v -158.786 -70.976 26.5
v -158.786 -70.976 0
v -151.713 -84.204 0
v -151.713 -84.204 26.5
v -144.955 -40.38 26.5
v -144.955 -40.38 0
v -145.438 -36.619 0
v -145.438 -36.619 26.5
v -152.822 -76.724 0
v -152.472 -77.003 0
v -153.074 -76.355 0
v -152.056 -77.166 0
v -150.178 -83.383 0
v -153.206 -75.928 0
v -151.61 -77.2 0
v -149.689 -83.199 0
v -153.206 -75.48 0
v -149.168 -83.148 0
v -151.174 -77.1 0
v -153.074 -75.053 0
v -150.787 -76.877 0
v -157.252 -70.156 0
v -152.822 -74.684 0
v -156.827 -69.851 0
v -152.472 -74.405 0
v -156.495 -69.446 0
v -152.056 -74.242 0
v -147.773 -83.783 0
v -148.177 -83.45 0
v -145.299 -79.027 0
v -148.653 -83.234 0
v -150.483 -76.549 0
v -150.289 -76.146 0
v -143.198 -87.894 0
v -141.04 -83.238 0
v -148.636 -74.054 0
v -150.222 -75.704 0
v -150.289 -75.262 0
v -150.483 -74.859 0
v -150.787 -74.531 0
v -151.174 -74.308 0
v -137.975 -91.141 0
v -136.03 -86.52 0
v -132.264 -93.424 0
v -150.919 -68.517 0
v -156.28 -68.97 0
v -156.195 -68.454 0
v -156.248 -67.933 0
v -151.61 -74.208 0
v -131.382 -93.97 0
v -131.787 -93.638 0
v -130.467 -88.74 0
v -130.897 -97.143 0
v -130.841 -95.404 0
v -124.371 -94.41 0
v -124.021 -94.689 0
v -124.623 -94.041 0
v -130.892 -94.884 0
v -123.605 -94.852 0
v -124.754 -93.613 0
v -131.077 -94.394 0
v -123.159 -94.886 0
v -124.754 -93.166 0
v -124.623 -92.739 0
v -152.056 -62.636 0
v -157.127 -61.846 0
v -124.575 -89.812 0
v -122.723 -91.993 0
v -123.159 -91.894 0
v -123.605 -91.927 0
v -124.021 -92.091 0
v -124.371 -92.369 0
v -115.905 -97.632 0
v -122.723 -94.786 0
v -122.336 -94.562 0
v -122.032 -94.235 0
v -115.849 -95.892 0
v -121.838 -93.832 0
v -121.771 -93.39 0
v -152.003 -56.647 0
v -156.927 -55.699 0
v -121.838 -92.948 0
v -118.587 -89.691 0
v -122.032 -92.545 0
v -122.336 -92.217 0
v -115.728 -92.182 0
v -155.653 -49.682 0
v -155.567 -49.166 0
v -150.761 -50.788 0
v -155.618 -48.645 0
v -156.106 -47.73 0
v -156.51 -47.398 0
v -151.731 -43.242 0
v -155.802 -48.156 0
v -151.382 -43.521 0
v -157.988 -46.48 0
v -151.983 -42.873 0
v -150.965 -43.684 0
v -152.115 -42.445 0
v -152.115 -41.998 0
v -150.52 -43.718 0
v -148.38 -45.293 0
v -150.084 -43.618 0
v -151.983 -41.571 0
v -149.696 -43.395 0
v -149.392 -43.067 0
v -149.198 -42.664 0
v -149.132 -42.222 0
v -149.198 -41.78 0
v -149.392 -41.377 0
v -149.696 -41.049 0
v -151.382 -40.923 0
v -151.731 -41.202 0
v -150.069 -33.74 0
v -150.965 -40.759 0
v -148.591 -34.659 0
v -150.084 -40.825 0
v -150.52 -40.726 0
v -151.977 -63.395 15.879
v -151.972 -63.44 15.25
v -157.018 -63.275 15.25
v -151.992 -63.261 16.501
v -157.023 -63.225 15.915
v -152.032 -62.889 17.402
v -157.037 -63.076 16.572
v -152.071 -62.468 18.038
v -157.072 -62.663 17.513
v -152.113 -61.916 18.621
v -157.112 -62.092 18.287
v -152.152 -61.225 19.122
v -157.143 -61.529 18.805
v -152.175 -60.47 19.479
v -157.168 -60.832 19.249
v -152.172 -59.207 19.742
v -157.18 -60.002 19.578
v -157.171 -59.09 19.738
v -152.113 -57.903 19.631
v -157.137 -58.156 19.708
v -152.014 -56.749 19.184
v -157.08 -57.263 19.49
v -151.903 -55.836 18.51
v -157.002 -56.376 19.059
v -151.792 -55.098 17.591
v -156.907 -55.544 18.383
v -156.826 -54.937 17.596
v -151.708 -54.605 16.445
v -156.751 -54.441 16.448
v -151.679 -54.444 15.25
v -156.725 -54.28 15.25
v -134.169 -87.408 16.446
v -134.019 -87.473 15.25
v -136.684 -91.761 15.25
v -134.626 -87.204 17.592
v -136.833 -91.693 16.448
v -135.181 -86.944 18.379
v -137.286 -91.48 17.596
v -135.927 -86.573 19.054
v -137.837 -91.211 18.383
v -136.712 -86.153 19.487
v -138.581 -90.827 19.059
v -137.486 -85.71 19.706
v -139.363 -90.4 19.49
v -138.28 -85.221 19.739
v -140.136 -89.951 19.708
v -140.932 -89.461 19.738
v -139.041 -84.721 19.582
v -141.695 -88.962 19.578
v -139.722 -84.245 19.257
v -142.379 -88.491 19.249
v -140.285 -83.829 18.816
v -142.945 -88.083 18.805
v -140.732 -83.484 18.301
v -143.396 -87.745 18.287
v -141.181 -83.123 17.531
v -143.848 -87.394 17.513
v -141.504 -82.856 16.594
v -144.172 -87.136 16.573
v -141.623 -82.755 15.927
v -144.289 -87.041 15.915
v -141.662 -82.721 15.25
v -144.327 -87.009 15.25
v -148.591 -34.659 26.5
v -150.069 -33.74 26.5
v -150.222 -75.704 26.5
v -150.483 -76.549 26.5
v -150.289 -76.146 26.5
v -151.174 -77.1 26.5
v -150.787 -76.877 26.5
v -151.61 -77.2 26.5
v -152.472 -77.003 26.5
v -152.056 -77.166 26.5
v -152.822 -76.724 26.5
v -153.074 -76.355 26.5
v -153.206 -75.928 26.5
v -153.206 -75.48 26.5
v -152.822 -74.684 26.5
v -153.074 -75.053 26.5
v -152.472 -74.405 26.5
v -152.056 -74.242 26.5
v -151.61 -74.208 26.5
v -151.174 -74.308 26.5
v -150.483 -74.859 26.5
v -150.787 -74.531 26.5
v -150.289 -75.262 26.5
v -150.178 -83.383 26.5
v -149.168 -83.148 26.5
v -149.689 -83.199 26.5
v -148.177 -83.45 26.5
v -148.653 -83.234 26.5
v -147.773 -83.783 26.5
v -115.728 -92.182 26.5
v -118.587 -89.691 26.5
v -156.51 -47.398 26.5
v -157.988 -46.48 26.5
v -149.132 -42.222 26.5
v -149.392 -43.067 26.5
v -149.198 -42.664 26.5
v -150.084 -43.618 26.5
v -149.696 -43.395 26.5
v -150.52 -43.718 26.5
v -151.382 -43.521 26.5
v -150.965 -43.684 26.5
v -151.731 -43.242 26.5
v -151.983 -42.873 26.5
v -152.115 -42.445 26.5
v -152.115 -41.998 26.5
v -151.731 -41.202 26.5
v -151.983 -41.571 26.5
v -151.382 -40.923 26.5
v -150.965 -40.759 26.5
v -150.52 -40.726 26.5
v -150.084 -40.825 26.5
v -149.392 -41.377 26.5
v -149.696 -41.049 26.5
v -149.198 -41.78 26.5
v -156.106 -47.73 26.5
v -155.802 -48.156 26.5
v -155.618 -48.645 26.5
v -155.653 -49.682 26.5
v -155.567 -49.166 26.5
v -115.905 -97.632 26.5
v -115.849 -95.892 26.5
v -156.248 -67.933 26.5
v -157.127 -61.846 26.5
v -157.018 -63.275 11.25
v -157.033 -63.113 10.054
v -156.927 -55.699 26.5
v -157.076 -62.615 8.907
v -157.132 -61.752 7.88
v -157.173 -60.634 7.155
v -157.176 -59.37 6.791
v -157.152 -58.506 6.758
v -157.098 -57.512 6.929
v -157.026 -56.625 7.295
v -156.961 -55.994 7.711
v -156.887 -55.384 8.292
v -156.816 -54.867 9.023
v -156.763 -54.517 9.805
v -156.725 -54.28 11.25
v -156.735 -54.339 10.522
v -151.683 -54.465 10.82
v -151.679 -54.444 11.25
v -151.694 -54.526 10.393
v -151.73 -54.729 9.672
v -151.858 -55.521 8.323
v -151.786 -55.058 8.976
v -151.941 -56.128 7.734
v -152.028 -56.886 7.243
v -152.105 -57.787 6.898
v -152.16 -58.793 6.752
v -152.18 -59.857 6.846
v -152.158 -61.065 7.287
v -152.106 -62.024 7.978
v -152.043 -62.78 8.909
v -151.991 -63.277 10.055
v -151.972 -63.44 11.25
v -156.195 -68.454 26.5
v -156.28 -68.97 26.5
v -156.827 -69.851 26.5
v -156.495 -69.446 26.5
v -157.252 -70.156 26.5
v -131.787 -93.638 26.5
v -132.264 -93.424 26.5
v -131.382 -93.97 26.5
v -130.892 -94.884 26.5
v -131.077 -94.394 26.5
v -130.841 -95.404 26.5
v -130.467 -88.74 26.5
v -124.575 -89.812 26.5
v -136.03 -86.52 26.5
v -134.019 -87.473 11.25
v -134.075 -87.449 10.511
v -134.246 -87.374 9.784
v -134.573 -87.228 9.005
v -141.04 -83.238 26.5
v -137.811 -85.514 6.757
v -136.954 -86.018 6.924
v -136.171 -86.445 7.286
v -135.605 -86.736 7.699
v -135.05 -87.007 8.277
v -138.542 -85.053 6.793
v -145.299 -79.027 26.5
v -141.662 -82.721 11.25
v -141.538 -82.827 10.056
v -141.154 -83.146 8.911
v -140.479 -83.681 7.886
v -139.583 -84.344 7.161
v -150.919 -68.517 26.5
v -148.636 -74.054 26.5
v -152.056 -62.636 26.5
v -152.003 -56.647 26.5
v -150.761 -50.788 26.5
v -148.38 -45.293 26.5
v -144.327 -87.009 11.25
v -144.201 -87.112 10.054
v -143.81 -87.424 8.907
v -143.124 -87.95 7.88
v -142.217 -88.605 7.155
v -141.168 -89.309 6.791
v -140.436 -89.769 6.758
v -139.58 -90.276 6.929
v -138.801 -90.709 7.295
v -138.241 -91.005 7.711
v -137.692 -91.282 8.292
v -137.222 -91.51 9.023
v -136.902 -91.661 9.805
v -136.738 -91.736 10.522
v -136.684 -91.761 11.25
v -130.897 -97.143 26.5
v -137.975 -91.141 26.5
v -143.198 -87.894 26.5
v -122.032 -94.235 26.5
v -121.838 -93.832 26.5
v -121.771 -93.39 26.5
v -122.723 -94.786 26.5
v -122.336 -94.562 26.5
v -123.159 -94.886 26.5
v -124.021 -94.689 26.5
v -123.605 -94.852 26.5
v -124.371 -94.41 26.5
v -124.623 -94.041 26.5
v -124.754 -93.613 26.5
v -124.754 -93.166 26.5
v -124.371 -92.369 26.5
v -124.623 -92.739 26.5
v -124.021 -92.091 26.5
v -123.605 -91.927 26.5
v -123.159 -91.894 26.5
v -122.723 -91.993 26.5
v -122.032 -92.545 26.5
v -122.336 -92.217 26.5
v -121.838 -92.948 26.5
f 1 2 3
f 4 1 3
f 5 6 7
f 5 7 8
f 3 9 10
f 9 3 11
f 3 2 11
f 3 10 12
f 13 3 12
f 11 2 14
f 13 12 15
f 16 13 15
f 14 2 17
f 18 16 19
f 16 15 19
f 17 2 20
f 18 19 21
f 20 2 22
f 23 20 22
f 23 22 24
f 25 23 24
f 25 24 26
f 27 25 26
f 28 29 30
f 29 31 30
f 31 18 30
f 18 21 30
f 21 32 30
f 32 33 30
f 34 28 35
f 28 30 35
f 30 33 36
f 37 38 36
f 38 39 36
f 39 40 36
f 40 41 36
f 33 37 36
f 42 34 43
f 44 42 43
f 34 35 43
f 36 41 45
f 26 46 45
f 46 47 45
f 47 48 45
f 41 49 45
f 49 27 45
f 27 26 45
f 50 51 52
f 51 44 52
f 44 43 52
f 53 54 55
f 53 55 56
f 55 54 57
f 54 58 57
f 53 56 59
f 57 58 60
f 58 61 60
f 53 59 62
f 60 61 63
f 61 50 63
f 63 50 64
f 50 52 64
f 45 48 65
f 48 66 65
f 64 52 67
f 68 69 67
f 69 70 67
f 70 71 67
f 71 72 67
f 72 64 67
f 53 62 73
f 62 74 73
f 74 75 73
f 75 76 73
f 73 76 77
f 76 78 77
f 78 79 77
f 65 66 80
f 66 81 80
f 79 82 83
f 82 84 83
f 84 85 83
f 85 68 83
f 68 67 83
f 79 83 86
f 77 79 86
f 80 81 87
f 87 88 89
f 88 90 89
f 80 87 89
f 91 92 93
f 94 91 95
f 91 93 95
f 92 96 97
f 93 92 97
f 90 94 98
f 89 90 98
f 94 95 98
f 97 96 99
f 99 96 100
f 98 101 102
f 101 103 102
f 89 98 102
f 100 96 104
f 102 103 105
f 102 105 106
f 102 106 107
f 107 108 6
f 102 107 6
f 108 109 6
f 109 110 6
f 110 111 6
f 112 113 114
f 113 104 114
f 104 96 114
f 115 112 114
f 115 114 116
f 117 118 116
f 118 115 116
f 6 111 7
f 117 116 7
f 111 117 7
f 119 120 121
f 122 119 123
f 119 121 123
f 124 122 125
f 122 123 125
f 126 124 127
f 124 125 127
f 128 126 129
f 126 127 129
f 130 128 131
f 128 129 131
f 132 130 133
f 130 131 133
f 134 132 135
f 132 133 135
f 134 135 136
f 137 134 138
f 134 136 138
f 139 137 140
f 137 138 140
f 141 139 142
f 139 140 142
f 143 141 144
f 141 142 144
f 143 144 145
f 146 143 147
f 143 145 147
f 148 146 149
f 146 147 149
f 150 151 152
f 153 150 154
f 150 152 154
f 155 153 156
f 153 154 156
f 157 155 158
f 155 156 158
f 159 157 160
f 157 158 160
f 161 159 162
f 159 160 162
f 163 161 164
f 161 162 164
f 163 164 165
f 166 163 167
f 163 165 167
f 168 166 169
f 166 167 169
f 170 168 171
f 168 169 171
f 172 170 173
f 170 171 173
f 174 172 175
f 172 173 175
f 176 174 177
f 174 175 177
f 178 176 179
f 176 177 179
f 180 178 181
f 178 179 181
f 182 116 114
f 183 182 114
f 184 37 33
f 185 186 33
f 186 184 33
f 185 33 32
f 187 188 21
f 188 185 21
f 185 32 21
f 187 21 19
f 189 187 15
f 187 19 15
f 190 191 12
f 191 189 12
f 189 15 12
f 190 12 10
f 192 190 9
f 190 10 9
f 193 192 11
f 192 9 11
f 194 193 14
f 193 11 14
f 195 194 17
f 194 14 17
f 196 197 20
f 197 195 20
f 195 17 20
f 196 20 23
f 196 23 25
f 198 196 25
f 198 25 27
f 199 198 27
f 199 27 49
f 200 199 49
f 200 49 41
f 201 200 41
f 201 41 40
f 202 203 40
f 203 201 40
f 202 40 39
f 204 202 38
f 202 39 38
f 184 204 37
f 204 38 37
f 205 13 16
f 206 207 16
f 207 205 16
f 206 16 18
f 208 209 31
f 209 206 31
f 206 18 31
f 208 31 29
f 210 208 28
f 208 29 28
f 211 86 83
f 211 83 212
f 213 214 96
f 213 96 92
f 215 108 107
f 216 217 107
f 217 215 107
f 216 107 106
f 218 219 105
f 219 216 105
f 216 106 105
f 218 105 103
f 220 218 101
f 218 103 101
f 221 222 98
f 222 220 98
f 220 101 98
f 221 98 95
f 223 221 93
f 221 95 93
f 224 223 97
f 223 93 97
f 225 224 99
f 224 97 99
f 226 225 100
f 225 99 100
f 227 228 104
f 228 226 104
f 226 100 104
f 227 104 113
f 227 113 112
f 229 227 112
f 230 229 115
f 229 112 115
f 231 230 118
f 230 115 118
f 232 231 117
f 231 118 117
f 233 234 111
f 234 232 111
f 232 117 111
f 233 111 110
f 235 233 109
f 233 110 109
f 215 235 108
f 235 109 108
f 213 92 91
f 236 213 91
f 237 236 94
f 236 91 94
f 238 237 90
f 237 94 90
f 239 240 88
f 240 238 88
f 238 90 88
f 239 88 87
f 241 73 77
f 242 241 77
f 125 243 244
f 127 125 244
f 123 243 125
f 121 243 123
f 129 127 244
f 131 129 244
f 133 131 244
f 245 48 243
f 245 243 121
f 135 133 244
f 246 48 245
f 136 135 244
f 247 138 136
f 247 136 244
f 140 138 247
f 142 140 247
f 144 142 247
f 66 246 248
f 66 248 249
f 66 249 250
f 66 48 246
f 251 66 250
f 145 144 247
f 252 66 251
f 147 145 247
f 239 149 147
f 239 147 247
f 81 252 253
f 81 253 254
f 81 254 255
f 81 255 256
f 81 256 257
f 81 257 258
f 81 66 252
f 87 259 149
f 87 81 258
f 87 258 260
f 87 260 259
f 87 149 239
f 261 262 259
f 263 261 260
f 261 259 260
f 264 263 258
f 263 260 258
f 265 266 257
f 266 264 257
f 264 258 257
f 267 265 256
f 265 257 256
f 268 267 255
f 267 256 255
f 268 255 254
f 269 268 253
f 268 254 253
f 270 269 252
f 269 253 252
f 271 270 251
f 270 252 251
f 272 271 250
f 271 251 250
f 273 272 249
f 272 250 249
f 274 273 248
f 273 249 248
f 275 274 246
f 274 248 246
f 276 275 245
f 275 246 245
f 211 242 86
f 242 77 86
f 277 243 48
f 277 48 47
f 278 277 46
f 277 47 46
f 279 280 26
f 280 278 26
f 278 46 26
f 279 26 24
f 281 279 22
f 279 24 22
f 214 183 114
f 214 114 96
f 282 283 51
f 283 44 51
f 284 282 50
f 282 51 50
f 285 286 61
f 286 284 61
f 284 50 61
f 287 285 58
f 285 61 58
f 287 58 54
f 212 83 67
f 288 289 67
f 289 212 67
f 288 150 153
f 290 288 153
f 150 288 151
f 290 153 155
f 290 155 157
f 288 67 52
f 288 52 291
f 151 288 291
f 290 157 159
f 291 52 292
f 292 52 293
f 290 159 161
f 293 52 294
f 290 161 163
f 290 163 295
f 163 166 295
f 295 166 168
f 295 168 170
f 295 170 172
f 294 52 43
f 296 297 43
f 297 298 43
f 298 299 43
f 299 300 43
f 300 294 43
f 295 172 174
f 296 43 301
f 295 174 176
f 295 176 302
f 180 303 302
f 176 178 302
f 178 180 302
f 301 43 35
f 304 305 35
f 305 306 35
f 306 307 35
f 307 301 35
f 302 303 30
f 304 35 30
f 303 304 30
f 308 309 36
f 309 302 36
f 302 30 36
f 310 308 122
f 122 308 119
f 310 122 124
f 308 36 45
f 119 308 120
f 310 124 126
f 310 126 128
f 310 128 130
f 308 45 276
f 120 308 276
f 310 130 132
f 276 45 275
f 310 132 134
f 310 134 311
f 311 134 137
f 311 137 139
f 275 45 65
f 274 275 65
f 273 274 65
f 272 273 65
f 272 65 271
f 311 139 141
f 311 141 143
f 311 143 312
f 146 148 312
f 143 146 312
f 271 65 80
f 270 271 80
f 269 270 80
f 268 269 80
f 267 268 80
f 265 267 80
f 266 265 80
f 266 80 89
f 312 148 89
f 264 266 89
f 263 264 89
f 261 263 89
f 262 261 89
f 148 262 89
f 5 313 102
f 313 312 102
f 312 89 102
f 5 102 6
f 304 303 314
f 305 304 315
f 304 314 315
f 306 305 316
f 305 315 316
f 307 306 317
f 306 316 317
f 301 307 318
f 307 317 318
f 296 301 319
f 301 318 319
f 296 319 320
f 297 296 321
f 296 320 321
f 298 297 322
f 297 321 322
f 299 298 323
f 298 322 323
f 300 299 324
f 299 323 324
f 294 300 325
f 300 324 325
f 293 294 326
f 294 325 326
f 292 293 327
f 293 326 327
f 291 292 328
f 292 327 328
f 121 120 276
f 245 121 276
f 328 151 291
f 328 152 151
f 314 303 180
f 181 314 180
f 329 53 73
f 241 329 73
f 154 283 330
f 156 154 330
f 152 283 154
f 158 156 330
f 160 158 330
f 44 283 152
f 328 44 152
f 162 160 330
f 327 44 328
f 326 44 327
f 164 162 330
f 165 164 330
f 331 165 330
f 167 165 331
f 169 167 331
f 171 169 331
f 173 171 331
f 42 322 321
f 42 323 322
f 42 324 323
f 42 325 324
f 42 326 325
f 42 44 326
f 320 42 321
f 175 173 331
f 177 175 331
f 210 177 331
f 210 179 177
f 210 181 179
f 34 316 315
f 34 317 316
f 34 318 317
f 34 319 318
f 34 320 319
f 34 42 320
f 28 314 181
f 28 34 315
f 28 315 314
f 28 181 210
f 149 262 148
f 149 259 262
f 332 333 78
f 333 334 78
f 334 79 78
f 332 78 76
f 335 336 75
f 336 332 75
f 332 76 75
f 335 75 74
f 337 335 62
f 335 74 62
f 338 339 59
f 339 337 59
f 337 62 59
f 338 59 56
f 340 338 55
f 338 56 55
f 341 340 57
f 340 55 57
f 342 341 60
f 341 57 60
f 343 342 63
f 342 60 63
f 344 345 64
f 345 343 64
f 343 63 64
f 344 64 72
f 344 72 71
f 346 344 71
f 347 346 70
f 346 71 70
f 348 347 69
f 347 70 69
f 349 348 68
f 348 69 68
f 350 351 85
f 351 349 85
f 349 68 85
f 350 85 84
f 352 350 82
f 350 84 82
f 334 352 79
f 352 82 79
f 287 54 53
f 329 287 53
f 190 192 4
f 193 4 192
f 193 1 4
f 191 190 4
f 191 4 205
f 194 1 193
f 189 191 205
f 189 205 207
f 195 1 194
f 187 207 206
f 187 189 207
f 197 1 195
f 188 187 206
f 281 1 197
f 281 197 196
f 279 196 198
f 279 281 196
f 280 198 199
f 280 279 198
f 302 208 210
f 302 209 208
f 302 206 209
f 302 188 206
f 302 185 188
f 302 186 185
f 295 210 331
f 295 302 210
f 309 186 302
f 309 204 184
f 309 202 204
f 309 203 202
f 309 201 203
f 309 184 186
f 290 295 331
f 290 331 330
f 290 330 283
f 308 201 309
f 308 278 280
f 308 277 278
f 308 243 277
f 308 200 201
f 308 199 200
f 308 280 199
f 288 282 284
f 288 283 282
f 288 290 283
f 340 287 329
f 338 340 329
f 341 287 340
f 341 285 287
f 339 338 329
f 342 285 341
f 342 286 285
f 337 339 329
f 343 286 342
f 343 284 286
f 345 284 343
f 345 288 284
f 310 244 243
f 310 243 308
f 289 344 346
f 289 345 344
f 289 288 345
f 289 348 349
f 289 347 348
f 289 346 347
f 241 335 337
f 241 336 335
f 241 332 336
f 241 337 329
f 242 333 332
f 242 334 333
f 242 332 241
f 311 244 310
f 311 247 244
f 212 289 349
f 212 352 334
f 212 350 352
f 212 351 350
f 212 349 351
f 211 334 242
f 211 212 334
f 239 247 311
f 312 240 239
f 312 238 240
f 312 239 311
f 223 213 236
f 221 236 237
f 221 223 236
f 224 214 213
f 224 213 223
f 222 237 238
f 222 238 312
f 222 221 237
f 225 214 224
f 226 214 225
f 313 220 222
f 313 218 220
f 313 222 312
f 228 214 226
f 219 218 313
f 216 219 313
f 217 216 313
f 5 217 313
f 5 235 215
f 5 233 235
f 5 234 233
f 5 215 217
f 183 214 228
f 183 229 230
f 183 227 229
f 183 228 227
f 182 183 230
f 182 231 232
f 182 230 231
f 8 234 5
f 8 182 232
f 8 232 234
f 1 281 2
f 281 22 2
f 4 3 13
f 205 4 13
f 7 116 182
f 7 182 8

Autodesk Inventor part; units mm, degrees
ref_plane "Work Plane1" through (0, 0, 0) normal (0, 0, 1) x (1, 0, 0)
sketch "Sketch1" plane through (0, 0, 0) normal (0, 0, 1) x (1, 0, 0)
  line L0 (-114.7595, -23.8164) -> (-86.516, -0.3214) projected
  arc A0 (-83.238, -1.9261) -> (-86.516, -0.3214) centre (-85.2369, -1.8589) ccw projected
  arc A1 (-83.238, -1.9261) -> (-80.4978, -22.1613) centre (-22.2724, -3.9734) ccw projected
  arc A2 (-84.3159, -27.354) -> (-80.4978, -22.1613) centre (-84.3159, -23.354) ccw projected
  line L1 (-84.3159, -27.354) -> (-113.4805, -27.354) projected
  arc A3 (-114.7595, -23.8164) -> (-113.4805, -27.354) centre (-113.4805, -25.354) ccw projected
  circle A4 centre (71.296, -16.8454) radius 1.5 projected
  circle A5 centre (-18.8152, -59.8032) radius 1.5 projected
  circle A6 centre (-53.4562, -50.8504) radius 1.5 projected
  circle A7 centre (-60.8075, 36.5725) radius 1.5 projected
  circle A8 centre (-28.5162, 51.9811) radius 1.5 projected
  circle A9 centre (-9.173, 50.4079) radius 1.5 projected
  circle A10 centre (-44.8423, 47.6065) radius 1.5 projected
  circle A11 centre (-67.2628, -37.2117) radius 1.5 projected
  circle A12 centre (-38.1378, -57.9935) radius 1.5 projected
  circle A13 centre (45.81, -34.6909) radius 1.5 projected
  circle A14 centre (-22.2724, -3.9734) radius 24.5 projected
  line L2 (17.4995, 54.7179) -> (28.6687, 48.4472) projected
  line L3 (8.4026, 48.2499) -> (17.4995, 54.7179) projected
  arc A15 (6.5013, 48.0227) -> (8.4026, 48.2499) centre (7.2436, 49.8798) ccw projected
  line L4 (-7.3529, 53.5603) -> (6.5013, 48.0227) projected
  arc A16 (-7.3529, 53.5603) -> (-12.4241, 54.6417) centre (-22.2724, -3.9734) ccw projected
  line L5 (-12.5849, 53.6843) -> (-12.4241, 54.6417) projected
  arc A17 (-14.821, 52.0331) -> (-12.5849, 53.6843) centre (-14.5573, 54.0157) ccw projected
  arc A18 (-14.821, 52.0331) -> (-23.537, 52.5125) centre (-22.2724, -3.9734) ccw projected
  arc A19 (-25.5786, 54.3989) -> (-23.537, 52.5125) centre (-23.5818, 54.512) ccw projected
  line L6 (-25.6541, 55.7327) -> (-25.5786, 54.3989) projected
  arc A20 (-25.6541, 55.7327) -> (-31.8766, 55.0521) centre (-22.2724, -3.9734) ccw projected
  line L7 (-43.4677, 51.9463) -> (-31.8766, 55.0521) projected
  arc A21 (-43.4677, 51.9463) -> (-49.1968, 49.4245) centre (-22.2724, -3.9734) ccw projected
  line L8 (-48.5953, 48.2316) -> (-49.1968, 49.4245) projected
  arc A22 (-49.4201, 45.5771) -> (-48.5953, 48.2316) centre (-50.3811, 47.3311) ccw projected
  arc A23 (-49.4201, 45.5771) -> (-56.7287, 40.804) centre (-22.2724, -3.9734) ccw projected
  arc A24 (-59.4908, 41.1159) -> (-56.7287, 40.804) centre (-57.9484, 42.389) ccw projected
  line L9 (-60.1088, 41.8646) -> (-59.4908, 41.1159) projected
  arc A25 (-60.1088, 41.8646) -> (-63.9599, 38.3925) centre (-22.2724, -3.9734) ccw projected
  line L10 (-73.8637, 25.8129) -> (-63.9599, 38.3925) projected
  line L11 (-73.8637, 25.8129) -> (-144.5637, -33.0004) projected
  arc A26 (-144.5637, -33.0004) -> (-146.1648, -34.4172) centre (-122.1805, -59.9075) ccw projected
  arc A27 (-148.5912, -34.6592) -> (-146.1648, -34.4172) centre (-147.5353, -32.9607) ccw projected
  line L12 (-148.5912, -34.6592) -> (-150.0693, -33.7404) projected
  line L13 (-150.0693, -33.7404) -> (-157.9882, -46.4797) projected
  line L14 (-157.9882, -46.4797) -> (-156.5102, -47.3985) projected
  arc A28 (-155.6533, -49.6815) -> (-156.5102, -47.3985) centre (-157.566, -49.0971) ccw projected
  arc A29 (-155.6533, -49.6815) -> (-156.2478, -67.9334) centre (-122.1805, -59.9075) ccw projected
  arc A30 (-157.2515, -70.1557) -> (-156.2478, -67.9334) centre (-158.1945, -68.392) ccw projected
  line L15 (-157.2515, -70.1557) -> (-158.7862, -70.9764) projected
  line L16 (-158.7862, -70.9764) -> (-151.7131, -84.204) projected
  line L17 (-151.7131, -84.204) -> (-150.1784, -83.3834) projected
  arc A31 (-147.7729, -83.7828) -> (-150.1784, -83.3834) centre (-149.2353, -85.1471) ccw projected
  arc A32 (-147.7729, -83.7828) -> (-132.2635, -93.4236) centre (-122.1805, -59.9075) ccw projected
  arc A33 (-130.8408, -95.404) -> (-132.2635, -93.4236) centre (-132.8397, -95.3388) ccw projected
  line L18 (-130.8408, -95.404) -> (-130.8974, -97.1434) projected
  line L19 (-130.8974, -97.1434) -> (-115.9054, -97.6318) projected
  line L20 (-115.9054, -97.6318) -> (-115.8487, -95.8923) projected
  arc A34 (-114.3001, -94.0088) -> (-115.8487, -95.8923) centre (-113.8498, -95.9574) ccw projected
  arc A35 (-114.3001, -94.0088) -> (-111.5272, -93.2468) centre (-122.1805, -59.9075) ccw projected
  line L21 (-111.5272, -93.2468) -> (-17.5702, -63.2237) projected
  line L22 (-1.8974, -59.9532) -> (-17.5702, -63.2237) projected
  line L23 (-3.6226, -55.2133) -> (-1.8974, -59.9532) projected
  arc A36 (-2.4006, -52.6404) -> (-3.6226, -55.2133) centre (-1.7432, -54.5293) ccw projected
  line L24 (40.7711, -37.6143) -> (-2.4006, -52.6404) projected
  arc A37 (41.7759, -37.5336) -> (40.7711, -37.6143) centre (41.4286, -39.5032) ccw projected
  line L25 (49.1414, -38.8323) -> (41.7759, -37.5336) projected
  line L26 (49.5371, -36.5883) -> (49.1414, -38.8323) projected
  arc A38 (51.1536, -34.967) -> (49.5371, -36.5883) centre (51.5067, -36.9355) ccw projected
  arc A39 (51.1536, -34.967) -> (69.7278, -21.9611) centre (46.3856, -8.3913) ccw projected
  arc A40 (71.8042, -20.9967) -> (69.7278, -21.9611) centre (71.4569, -22.9663) ccw projected
  line L27 (74.0482, -21.3924) -> (71.8042, -20.9967) projected
  line L28 (78.128, 1.745) -> (74.0482, -21.3924) projected
  line L29 (78.128, 1.745) -> (69.8258, 3.2089) projected
  arc A41 (28.6687, 48.4472) -> (69.8258, 3.2089) centre (78.5082, 52.4493) ccw projected
  circle A42 centre (46.3856, -8.3913) radius 8 projected
  circle A43 centre (24.8362, 42.9855) radius 2.1 projected
  circle A44 centre (69.0444, -1.2227) radius 2.1 projected
  circle A45 centre (32.9741, 22.501) radius 2.1 projected
  circle A46 centre (48.56, 6.9152) radius 2.1 projected
  line L30 (61.5225, -11.0604) -> (64.993, -11.6723) projected
  arc A47 (66.5678, -14.1946) -> (64.993, -11.6723) centre (64.6457, -13.6419) ccw projected
  arc A48 (55.6053, -27.2592) -> (66.5678, -14.1946) centre (46.3856, -8.3913) ccw projected
  arc A49 (52.8479, -26.1463) -> (55.6053, -27.2592) centre (54.7273, -25.4622) ccw projected
  line L31 (52.8479, -26.1463) -> (51.6426, -22.8348) projected
  arc A50 (52.6012, -20.3753) -> (51.6426, -22.8348) centre (53.522, -22.1507) ccw projected
  arc A51 (52.6012, -20.3753) -> (59.2669, -12.4314) centre (46.3856, -8.3913) ccw projected
  arc A52 (61.5225, -11.0604) -> (59.2669, -12.4314) centre (61.1752, -13.03) ccw projected
  arc A53 (28.8077, -30.3754) -> (33.319, -18.6649) centre (-22.2724, -3.9734) ccw projected
  arc A54 (36.6892, -17.7843) -> (33.319, -18.6649) centre (35.2527, -19.1759) ccw projected
  arc A55 (36.6892, -17.7843) -> (42.4768, -21.313) centre (46.3856, -8.3913) ccw projected
  arc A56 (43.0588, -24.8558) -> (42.4768, -21.313) centre (41.8977, -23.2274) ccw projected
  line L32 (43.0588, -24.8558) -> (31.7455, -32.9222) projected
  arc A57 (28.8077, -30.3754) -> (31.7455, -32.9222) centre (30.5844, -31.2938) ccw projected
  arc A58 (36.3695, 11.8712) -> (41.3146, 7.2953) centre (78.5082, 52.4493) ccw projected
  arc A59 (40.8614, 3.9267) -> (41.3146, 7.2953) centre (40.043, 5.7516) ccw projected
  arc A60 (40.8614, 3.9267) -> (37.576, 1.8381) centre (46.3856, -8.3913) ccw projected
  arc A61 (34.2864, 3.1052) -> (37.576, 1.8381) centre (36.2709, 3.3536) ccw projected
  arc A62 (34.2864, 3.1052) -> (32.9898, 9.9939) centre (-22.2724, -3.9734) ccw projected
  arc A63 (36.3695, 11.8712) -> (32.9898, 9.9939) centre (34.9289, 10.4839) ccw projected
  circle A64 centre (-78.0027, -75.3364) radius 2 projected
  circle A65 centre (-110.6431, -14.2192) radius 2 projected
  circle A66 centre (-91.7471, -81.3441) radius 2 projected
  circle A67 centre (-123.1684, -22.4726) radius 2 projected
  circle A68 centre (-123.2712, -93.3897) radius 1.5 projected
  circle A69 centre (-150.6316, -42.2218) radius 1.5 projected
  circle A70 centre (-151.7223, -75.704) radius 1.5 projected
  circle A71 centre (-76.5892, -34.383) radius 2.05 projected
  circle A72 centre (-93.5857, -34.7301) radius 2.05 projected
  circle A73 centre (-85.7696, -48.6911) radius 2.05 projected
  line L33 (25.2192, -8.9275) -> (12.7605, -6.9639) projected
  arc A74 (10.2276, -3.9982) -> (12.7605, -6.9639) centre (13.2276, -4.0005) ccw projected
  arc A75 (10.2276, -3.9982) -> (9.854, 0.9403) centre (-22.2724, -3.9734) ccw projected
  arc A76 (12.117, 4.3104) -> (9.854, 0.9403) centre (12.8195, 1.3938) ccw projected
  line L34 (12.117, 4.3104) -> (24.3016, 7.2454) projected
  arc A77 (27.9589, 4.8477) -> (24.3016, 7.2454) centre (25.0042, 4.3289) ccw projected
  arc A78 (28.6837, -6.0885) -> (27.9589, 4.8477) centre (-22.2724, -3.9734) ccw projected
  arc A79 (25.2192, -8.9275) -> (28.6837, -6.0885) centre (25.6863, -5.9641) ccw projected
  line L35 (18.5933, -28.9733) -> (7.9021, -22.4328) projected
  arc A80 (6.7854, -18.53) -> (7.9021, -22.4328) centre (9.4676, -19.8737) ccw projected
  arc A81 (6.7854, -18.53) -> (8.6598, -13.9459) centre (-22.2724, -3.9734) ccw projected
  arc A82 (11.9821, -11.903) -> (8.6598, -13.9459) centre (11.515, -14.8664) ccw projected
  line L36 (11.9821, -11.903) -> (24.4408, -13.8666) projected
  arc A83 (26.8641, -17.6335) -> (24.4408, -13.8666) centre (23.9738, -16.83) ccw projected
  arc A84 (22.8108, -27.8167) -> (26.8641, -17.6335) centre (-22.2724, -3.9734) ccw projected
  arc A85 (18.5933, -28.9733) -> (22.8108, -27.8167) centre (20.1588, -26.4142) ccw projected
  line L37 (-4.4447, -43.3488) -> (-7.3459, -35.8081) projected
  arc A86 (-6.0439, -32.1316) -> (-7.3459, -35.8081) centre (-4.5459, -34.7308) ccw projected
  arc A87 (-6.0439, -32.1316) -> (-1.9539, -29.3388) centre (-22.2724, -3.9734) ccw projected
  arc A88 (2.0962, -29.6136) -> (-1.9539, -29.3388) centre (-0.0783, -31.6803) ccw projected
  line L38 (2.0962, -29.6136) -> (7.6236, -35.4294) projected
  arc A89 (7.3609, -39.808) -> (7.6236, -35.4294) centre (5.449, -37.4961) ccw projected
  arc A90 (-0.2222, -44.9128) -> (7.3609, -39.808) centre (-22.2724, -3.9734) ccw projected
  arc A91 (-4.4447, -43.3488) -> (-0.2222, -44.9128) centre (-1.6448, -42.2715) ccw projected
  line L39 (-23.3755, -47.3558) -> (-23.1715, -39.3349) projected
  arc A92 (-20.35, -36.4165) -> (-23.1715, -39.3349) centre (-20.1725, -39.4112) ccw projected
  arc A93 (-20.35, -36.4165) -> (-15.4428, -35.7477) centre (-22.2724, -3.9734) ccw projected
  arc A94 (-12.0124, -37.6034) -> (-15.4428, -35.7477) centre (-14.8123, -38.6807) ccw projected
  line L40 (-12.0124, -37.6034) -> (-9.1112, -45.1441) projected
  arc A95 (-11.1966, -49.135) -> (-9.1112, -45.1441) centre (-11.9112, -46.2214) ccw projected
  arc A96 (-20.2457, -50.4292) -> (-11.1966, -49.135) centre (-22.2724, -3.9734) ccw projected
  arc A97 (-23.3755, -47.3558) -> (-20.2457, -50.4292) centre (-20.3765, -47.432) ccw projected
  line L41 (-50.3087, -42.6252) -> (-42.3788, -32.8175) projected
  arc A98 (-38.5439, -32.1067) -> (-42.3788, -32.8175) centre (-40.0459, -34.7037) ccw projected
  arc A99 (-38.5439, -32.1067) -> (-34.0803, -34.2525) centre (-22.2724, -3.9734) ccw projected
  arc A100 (-32.2932, -37.8973) -> (-34.0803, -34.2525) centre (-35.1703, -37.0474) ccw projected
  line L42 (-32.2932, -37.8973) -> (-35.8437, -49.917) projected
  arc A101 (-39.7488, -51.8855) -> (-35.8437, -49.917) centre (-38.7208, -49.0672) ccw projected
  arc A102 (-49.5823, -47.0451) -> (-39.7488, -51.8855) centre (-22.2724, -3.9734) ccw projected
  arc A103 (-50.3087, -42.6252) -> (-49.5823, -47.0451) centre (-47.9758, -44.5114) ccw projected
  line L43 (-64.3558, -26.8641) -> (-53.346, -20.8755) projected
  arc A104 (-49.4077, -21.8598) -> (-53.346, -20.8755) centre (-51.9125, -23.5108) ccw projected
  arc A105 (-49.4077, -21.8598) -> (-46.3749, -25.7752) centre (-22.2724, -3.9734) ccw projected
  arc A106 (-46.2669, -29.6738) -> (-46.3749, -25.7752) centre (-48.5998, -27.7876) ccw projected
  line L44 (-46.2669, -29.6738) -> (-54.1968, -39.4816) projected
  arc A107 (-58.6707, -39.6968) -> (-54.1968, -39.4816) centre (-56.5296, -37.5954) ccw projected
  arc A108 (-65.463, -31.0949) -> (-58.6707, -39.6968) centre (-22.2724, -3.9734) ccw projected
  arc A109 (-64.3558, -26.8641) -> (-65.463, -31.0949) centre (-62.9223, -29.4995) ccw projected
  line L45 (-65.2864, 0.2751) -> (-57.3053, -0.9828) projected
  arc A110 (-54.7724, -3.9485) -> (-57.3053, -0.9828) centre (-57.7724, -3.9462) ccw projected
  arc A111 (-54.7724, -3.9485) -> (-54.3988, -8.887) centre (-22.2724, -3.9734) ccw projected
  arc A112 (-56.6618, -12.2571) -> (-54.3988, -8.887) centre (-57.3643, -9.3405) ccw projected
  line L46 (-56.6618, -12.2571) -> (-64.4621, -14.1361) projected
  arc A113 (-68.1227, -11.7192) -> (-64.4621, -14.1361) centre (-65.1646, -11.2195) ccw projected
  arc A114 (-68.7521, -2.5997) -> (-68.1227, -11.7192) centre (-22.2724, -3.9734) ccw projected
  arc A115 (-65.2864, 0.2751) -> (-68.7521, -2.5997) centre (-65.7534, -2.6883) ccw projected
  line L47 (-59.2911, 18.6731) -> (-52.4469, 14.4861) projected
  arc A116 (-51.3302, 10.5833) -> (-52.4469, 14.4861) centre (-54.0124, 11.927) ccw projected
  arc A117 (-51.3302, 10.5833) -> (-53.2046, 5.9991) centre (-22.2724, -3.9734) ccw projected
  arc A118 (-56.5269, 3.9563) -> (-53.2046, 5.9991) centre (-56.0599, 6.9197) ccw projected
  line L48 (-56.5269, 3.9563) -> (-64.5079, 5.2141) projected
  arc A119 (-66.9215, 9.0155) -> (-64.5079, 5.2141) centre (-64.0409, 8.1775) ccw projected
  arc A120 (-63.5177, 17.4994) -> (-66.9215, 9.0155) centre (-22.2724, -3.9734) ccw projected
  arc A121 (-59.2911, 18.6731) -> (-63.5177, 17.4994) centre (-60.8567, 16.114) ccw projected
  line L49 (-41.7278, 39.6327) -> (-37.199, 27.8613) projected
  arc A122 (-38.5009, 24.1849) -> (-37.199, 27.8613) centre (-39.9989, 26.7841) ccw projected
  arc A123 (-38.5009, 24.1849) -> (-42.5909, 21.3921) centre (-22.2724, -3.9734) ccw projected
  arc A124 (-46.641, 21.6668) -> (-42.5909, 21.3921) centre (-44.4665, 23.7336) ccw projected
  line L50 (-46.641, 21.6668) -> (-55.2752, 30.7515) projected
  arc A125 (-55.0274, 35.1177) -> (-55.2752, 30.7515) centre (-53.1006, 32.8182) ccw projected
  arc A126 (-45.9187, 41.2135) -> (-55.0274, 35.1177) centre (-22.2724, -3.9734) ccw projected
  arc A127 (-41.7278, 39.6327) -> (-45.9187, 41.2135) centre (-44.5277, 38.5555) ccw projected
  line L51 (-21.0547, 43.9173) -> (-21.3733, 31.3882) projected
  arc A128 (-24.1948, 28.4697) -> (-21.3733, 31.3882) centre (-24.3723, 31.4645) ccw projected
  arc A129 (-24.1948, 28.4697) -> (-29.1021, 27.8009) centre (-22.2724, -3.9734) ccw projected
  arc A130 (-32.5324, 29.6567) -> (-29.1021, 27.8009) centre (-29.7325, 30.7339) ccw projected
  line L52 (-32.5324, 29.6567) -> (-37.0613, 41.4281) projected
  arc A131 (-35.0106, 45.4102) -> (-37.0613, 41.4281) centre (-34.2613, 42.5053) ccw projected
  arc A132 (-24.1651, 46.9915) -> (-35.0106, 45.4102) centre (-22.2724, -3.9734) ccw projected
  arc A133 (-21.0547, 43.9173) -> (-24.1651, 46.9915) centre (-24.0537, 43.9936) ccw projected
  line L53 (5.7638, 34.6785) -> (-2.166, 24.8708) projected
  arc A134 (-6.0009, 24.16) -> (-2.166, 24.8708) centre (-4.4989, 26.757) ccw projected
  arc A135 (-6.0009, 24.16) -> (-10.4645, 26.3057) centre (-22.2724, -3.9734) ccw projected
  arc A136 (-12.2517, 29.9506) -> (-10.4645, 26.3057) centre (-9.3746, 29.1007) ccw projected
  line L54 (-12.2517, 29.9506) -> (-8.7012, 41.9703) projected
  arc A137 (-4.796, 43.9388) -> (-8.7012, 41.9703) centre (-5.8241, 41.1205) ccw projected
  arc A138 (5.0374, 39.0984) -> (-4.796, 43.9388) centre (-22.2724, -3.9734) ccw projected
  arc A139 (5.7638, 34.6785) -> (5.0374, 39.0984) centre (3.431, 36.5647) ccw projected
  circle A140 centre (18.7379, 18.9865) radius 2.05 projected
  circle A141 centre (5.6495, 11.6589) radius 2.05 projected
  arc A142 (-88.373, -68.9659) -> (-87.2274, -61.7195) centre (-122.1805, -59.9075) ccw projected
  arc A143 (-84.7539, -56.3391) -> (-87.2274, -61.7195) centre (-79.2381, -62.1337) ccw projected
  line L55 (-84.7539, -56.3391) -> (-72.896, -45.0519) projected
  arc A144 (-67.1926, -45.2429) -> (-72.896, -45.0519) centre (-70.1382, -47.9491) ccw projected
  arc A145 (-67.1926, -45.2429) -> (-52.2157, -57.1184) centre (-22.2724, -3.9734) ccw projected
  arc A146 (-52.5887, -60.766) -> (-52.2157, -57.1184) centre (-53.1975, -58.8609) ccw projected
  line L56 (-52.5887, -60.766) -> (-85.8324, -71.3887) projected
  arc A147 (-88.373, -68.9659) -> (-85.8324, -71.3887) centre (-86.4412, -69.4836) ccw projected
  arc A148 (-119.4703, -38.0751) -> (-123.464, -37.945) centre (-121.4642, -37.9192) ccw projected
  arc A149 (-100.218, -58.6239) -> (-119.4703, -38.0751) centre (-122.1805, -59.9075) ccw projected
  arc A150 (-100.3481, -62.6177) -> (-100.218, -58.6239) centre (-100.1921, -60.6238) ccw projected
  arc A151 (-120.8969, -81.87) -> (-100.3481, -62.6177) centre (-122.1805, -59.9075) ccw projected
  arc A152 (-124.8907, -81.7399) -> (-120.8969, -81.87) centre (-122.8968, -81.8958) ccw projected
  arc A153 (-144.143, -61.191) -> (-124.8907, -81.7399) centre (-122.1805, -59.9075) ccw projected
  arc A154 (-144.0129, -57.1973) -> (-144.143, -61.191) centre (-144.1688, -59.1912) ccw projected
  arc A155 (-123.464, -37.945) -> (-144.0129, -57.1973) centre (-122.1805, -59.9075) ccw projected
  circle A156 centre (-122.1805, -59.9075) radius 30
  line L57 (-148.5912, -34.6592) -> (-142.8906, -38.2028)
  line L58 (-115.8487, -95.8923) -> (-115.6302, -89.1836)
  point P0 (0, 0)
  dimension "d0" = 60
ref_plane "Work Plane2" through (-195.3769, -166.2263, 26.5) normal (0, 0, -1) x (-0.0309, 0.9995, 0)
extrude "Extrusion1" add sketch "Sketch1" along normal up to surface (26.5 mm away) contours L20 L19 L18 A33 A32 A31 L17 L16 L15 A30 A29 A28 L14 L13 L12 L57 A156 L58
chamfer "Chamfer1" distance 3 angle 45 2 edges at (-142.8906, -38.2028, 13.25) (-115.6302, -89.1836, 13.25)
ref_plane "Work Plane3" through (-157.9882, -46.4797, 0) normal (0.9995, -0.0326, 0) x (0, 0, 1)
sketch "Sketch2" plane through (-157.9882, -46.4797, 0) normal (0.9995, -0.0326, 0) x (0, 0, 1)
  line L0 (26.5, 3.124) -> (26.5, 21.3856) projected
  line L1 (0, 3.124) -> (26.5, 3.124) projected
  line L2 (0, 3.124) -> (0, 21.3856) projected
  line L3 (0, 21.3856) -> (26.5, 21.3856) projected
  line L4 (0, 23.6394) -> (0, 21.3856) projected
  line L5 (26.5, 3.124) -> (0, 21.3856)
  line L6 (0, 21.3856) -> (26.5, 21.3856)
  line L7 (26.5, 23.6394) -> (26.5, 21.3856) projected
  line L8 (26.5, 21.3856) -> (0, 3.124)
  line L9 (15.25, 12.2548) -> (11.25, 12.2548) construction
  line L10 (15.25, 16.7548) -> (11.25, 16.7548)
  line L11 (11.25, 7.7548) -> (15.25, 7.7548)
  arc A0 (15.25, 7.7548) -> (15.25, 16.7548) centre (15.25, 12.2548) ccw
  arc A1 (11.25, 16.7548) -> (11.25, 7.7548) centre (11.25, 12.2548) ccw
  point P0 (0, -51.5989)
  point P1 (13.25, 12.2548)
  dimension "d6" = 2
  dimension "d7" = 9
extrude "Extrusion2" cut sketch "Sketch2" along normal blind 10 contours A0 L11 A1 L8 L5 | L5 L8 A0 | L8 L5 A1 L10 A0 | A1 L5 L8
ref_plane "Work Plane4" through (-114.5435, -55.8238, 26.5) normal (-0.4715, 0.8818, 0) x (0, 0, 1)
mirror "Mirror1" about plane through (-114.5435, -55.8238, 26.5) normal (-0.4715, 0.8818, 0) of "Extrusion2"
properties part number "end_holder_3"
